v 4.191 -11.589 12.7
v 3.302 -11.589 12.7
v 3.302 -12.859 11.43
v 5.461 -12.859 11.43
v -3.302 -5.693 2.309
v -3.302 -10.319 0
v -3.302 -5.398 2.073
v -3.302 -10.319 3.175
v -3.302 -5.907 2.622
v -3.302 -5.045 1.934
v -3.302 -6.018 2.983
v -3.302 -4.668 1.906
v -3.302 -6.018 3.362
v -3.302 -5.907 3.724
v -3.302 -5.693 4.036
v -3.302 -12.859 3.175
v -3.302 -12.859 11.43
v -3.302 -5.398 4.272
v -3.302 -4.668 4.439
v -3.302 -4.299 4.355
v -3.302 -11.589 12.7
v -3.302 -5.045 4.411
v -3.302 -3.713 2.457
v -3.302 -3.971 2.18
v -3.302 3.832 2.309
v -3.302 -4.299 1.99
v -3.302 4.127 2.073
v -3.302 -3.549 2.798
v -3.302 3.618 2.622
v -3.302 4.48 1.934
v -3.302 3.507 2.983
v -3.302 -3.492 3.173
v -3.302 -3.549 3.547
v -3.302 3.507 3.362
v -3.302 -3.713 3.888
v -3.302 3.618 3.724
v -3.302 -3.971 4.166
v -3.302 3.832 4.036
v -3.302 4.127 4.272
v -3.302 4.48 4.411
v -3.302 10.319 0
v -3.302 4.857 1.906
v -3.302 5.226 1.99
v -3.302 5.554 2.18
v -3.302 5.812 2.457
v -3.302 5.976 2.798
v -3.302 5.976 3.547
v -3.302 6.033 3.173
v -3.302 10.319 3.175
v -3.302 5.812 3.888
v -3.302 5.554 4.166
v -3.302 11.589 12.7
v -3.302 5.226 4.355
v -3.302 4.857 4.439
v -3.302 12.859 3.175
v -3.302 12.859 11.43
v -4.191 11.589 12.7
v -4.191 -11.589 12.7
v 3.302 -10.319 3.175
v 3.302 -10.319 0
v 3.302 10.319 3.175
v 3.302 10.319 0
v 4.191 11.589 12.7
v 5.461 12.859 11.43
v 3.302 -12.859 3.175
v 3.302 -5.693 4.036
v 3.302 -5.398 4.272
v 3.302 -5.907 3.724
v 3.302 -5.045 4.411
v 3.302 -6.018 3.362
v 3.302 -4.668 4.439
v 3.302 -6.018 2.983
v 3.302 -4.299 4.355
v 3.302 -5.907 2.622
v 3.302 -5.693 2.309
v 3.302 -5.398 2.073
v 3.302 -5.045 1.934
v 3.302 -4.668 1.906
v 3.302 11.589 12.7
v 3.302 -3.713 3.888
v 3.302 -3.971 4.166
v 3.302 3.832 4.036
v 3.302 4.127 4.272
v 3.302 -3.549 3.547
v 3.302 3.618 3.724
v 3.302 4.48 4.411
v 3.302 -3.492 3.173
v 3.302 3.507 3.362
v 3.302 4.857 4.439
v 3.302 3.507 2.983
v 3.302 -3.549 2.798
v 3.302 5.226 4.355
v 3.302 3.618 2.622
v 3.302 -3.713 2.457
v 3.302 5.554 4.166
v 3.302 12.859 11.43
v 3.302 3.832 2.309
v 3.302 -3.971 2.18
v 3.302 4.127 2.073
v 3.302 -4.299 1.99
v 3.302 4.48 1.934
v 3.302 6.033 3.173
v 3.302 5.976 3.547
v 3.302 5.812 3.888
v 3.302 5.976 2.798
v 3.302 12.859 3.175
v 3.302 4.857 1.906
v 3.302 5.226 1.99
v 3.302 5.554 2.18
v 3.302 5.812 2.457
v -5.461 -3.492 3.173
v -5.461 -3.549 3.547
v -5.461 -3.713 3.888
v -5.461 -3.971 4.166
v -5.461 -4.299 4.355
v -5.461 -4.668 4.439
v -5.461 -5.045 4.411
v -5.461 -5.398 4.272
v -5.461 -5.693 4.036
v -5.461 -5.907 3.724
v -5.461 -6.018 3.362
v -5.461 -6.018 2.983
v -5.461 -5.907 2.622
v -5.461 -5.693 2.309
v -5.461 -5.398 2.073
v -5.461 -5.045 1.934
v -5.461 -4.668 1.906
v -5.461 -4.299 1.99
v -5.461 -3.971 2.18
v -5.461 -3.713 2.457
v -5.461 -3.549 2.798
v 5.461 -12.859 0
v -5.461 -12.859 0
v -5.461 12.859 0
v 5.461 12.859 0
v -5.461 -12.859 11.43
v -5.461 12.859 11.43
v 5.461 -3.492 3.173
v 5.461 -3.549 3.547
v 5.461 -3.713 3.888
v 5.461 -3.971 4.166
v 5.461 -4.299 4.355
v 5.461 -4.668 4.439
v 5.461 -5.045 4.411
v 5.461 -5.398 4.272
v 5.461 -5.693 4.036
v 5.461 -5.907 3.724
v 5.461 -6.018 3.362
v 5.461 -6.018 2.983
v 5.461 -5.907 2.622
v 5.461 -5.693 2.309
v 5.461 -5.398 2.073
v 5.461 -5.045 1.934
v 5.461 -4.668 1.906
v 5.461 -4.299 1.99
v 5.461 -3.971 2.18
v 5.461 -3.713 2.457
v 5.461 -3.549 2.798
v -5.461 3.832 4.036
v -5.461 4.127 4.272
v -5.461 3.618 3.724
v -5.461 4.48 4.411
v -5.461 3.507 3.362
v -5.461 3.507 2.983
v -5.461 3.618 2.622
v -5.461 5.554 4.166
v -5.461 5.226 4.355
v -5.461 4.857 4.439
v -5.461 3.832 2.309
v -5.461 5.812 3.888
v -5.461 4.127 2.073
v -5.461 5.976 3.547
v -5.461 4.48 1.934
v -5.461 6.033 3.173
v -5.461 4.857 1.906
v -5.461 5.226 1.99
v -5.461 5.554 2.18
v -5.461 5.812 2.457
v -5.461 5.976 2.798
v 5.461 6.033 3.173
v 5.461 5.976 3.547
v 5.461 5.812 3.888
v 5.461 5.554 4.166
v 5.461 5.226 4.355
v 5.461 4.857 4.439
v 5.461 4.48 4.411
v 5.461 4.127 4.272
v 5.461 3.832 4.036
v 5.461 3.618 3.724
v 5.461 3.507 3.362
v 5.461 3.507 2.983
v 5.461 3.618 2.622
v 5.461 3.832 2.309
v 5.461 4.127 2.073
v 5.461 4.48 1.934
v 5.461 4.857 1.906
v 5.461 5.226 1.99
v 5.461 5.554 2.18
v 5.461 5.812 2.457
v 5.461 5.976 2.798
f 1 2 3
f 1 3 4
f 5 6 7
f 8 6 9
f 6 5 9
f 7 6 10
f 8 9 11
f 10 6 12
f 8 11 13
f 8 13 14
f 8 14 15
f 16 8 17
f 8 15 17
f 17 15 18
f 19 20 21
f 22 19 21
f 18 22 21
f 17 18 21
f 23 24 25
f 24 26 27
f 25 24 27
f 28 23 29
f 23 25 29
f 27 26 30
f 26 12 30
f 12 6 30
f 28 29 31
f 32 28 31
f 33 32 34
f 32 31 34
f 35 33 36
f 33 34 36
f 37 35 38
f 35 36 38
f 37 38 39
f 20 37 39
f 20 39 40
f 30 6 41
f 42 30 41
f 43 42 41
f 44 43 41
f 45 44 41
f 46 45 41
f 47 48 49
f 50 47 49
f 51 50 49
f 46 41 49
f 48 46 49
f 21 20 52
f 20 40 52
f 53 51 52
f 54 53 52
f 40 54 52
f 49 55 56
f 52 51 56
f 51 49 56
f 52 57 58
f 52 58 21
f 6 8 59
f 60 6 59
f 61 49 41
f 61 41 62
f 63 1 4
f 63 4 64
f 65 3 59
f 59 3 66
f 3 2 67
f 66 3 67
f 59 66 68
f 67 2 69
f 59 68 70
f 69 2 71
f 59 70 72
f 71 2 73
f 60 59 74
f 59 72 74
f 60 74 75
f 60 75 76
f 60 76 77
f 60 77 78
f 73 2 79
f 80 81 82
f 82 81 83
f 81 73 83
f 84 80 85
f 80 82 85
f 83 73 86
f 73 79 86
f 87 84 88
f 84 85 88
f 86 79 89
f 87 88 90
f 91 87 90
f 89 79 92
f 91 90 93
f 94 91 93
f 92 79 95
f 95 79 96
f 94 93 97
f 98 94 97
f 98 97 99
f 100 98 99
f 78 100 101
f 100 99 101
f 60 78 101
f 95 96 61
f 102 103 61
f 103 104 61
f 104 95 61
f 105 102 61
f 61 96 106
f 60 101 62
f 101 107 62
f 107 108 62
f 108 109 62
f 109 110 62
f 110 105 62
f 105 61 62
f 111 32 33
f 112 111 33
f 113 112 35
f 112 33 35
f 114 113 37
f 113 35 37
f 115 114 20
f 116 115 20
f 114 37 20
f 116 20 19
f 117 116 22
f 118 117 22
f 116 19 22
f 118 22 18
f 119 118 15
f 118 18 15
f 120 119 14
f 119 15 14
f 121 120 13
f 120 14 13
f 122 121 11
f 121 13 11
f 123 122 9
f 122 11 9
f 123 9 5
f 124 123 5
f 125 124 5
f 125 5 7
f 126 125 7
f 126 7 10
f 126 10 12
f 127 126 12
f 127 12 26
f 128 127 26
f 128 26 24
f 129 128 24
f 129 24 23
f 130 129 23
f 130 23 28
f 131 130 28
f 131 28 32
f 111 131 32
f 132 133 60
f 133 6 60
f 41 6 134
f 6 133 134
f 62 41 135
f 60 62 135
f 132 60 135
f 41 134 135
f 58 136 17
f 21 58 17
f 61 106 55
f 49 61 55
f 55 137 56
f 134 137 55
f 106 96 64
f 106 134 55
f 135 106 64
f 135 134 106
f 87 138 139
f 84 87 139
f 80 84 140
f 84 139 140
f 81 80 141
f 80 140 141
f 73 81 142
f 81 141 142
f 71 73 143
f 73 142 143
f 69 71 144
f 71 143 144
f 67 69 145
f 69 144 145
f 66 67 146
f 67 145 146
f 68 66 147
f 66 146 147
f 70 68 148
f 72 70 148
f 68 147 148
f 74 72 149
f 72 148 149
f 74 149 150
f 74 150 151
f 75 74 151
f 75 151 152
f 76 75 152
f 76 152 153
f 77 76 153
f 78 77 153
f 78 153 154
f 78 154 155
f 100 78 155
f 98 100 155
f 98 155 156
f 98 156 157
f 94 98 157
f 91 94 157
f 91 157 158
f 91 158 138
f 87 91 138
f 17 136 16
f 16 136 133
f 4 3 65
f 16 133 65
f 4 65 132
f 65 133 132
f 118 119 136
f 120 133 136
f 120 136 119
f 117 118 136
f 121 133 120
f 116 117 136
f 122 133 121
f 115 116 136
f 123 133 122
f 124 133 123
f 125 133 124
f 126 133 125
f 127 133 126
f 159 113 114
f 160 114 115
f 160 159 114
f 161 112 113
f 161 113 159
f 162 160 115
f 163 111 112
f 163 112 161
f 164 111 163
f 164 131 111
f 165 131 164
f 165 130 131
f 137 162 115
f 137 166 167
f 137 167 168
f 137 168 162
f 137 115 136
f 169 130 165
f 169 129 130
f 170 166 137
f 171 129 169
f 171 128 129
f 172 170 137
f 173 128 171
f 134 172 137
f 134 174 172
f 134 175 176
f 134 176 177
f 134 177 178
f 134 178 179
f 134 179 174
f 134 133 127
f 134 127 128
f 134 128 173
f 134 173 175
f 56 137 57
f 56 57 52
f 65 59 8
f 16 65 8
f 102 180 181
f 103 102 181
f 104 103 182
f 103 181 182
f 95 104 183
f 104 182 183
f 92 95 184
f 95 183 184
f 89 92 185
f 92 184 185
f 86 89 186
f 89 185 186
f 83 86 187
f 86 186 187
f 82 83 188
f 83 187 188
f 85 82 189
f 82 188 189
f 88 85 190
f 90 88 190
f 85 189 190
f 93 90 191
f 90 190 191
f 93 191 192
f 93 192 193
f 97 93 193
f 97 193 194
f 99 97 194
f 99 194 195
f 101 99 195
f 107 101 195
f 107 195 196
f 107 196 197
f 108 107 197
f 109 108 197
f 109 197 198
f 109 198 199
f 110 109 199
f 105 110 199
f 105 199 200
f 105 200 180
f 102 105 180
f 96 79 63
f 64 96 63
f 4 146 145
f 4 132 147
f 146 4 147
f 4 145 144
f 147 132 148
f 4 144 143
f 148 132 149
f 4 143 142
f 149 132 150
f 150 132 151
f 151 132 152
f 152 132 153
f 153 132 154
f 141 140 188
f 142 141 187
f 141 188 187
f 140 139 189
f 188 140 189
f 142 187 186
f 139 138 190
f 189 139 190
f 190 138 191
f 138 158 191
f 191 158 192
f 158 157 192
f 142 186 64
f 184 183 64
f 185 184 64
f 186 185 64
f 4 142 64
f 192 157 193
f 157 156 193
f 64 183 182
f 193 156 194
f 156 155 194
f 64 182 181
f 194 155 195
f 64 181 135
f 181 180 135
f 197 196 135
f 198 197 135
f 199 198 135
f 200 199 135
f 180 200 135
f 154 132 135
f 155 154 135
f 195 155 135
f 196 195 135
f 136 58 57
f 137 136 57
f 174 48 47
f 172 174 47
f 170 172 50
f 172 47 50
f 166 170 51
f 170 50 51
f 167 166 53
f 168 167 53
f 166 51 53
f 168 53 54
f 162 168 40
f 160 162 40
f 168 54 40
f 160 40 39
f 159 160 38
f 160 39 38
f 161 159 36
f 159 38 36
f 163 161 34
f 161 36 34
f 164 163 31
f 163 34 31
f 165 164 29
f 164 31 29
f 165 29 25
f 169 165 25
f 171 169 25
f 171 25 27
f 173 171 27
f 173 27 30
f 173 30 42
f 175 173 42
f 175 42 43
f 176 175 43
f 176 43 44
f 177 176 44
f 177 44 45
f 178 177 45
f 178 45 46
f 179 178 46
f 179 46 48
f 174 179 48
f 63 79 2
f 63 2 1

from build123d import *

# Parameters (mm, degrees)
F0_W     = 10.922
F0_H     = 25.7175
F1_DEPTH = 12.7
F2_W     = 6.604
F2_H     = 20.6375
F3_DEPTH = 25.4
F5_DEPTH = 32.18438
F6_R     = 1.27
F7_DEPTH = 25.4
F8_SIZE  = 1.27


with BuildPart() as f1:
    # F0 (on Top) → F1 (new body)
    with BuildSketch(Plane.XY):
        Rectangle(F0_W, F0_H)
    extrude(amount=F1_DEPTH)

    # F2 (on face) → F3 (cut)
    with BuildSketch(Plane.XY.offset(12.7)):
        Rectangle(F2_W, F2_H)
    extrude(amount=-F3_DEPTH, mode=Mode.SUBTRACT)

    # F4 (on face) → F5 (cut)
    with BuildSketch(Plane(origin=(0, 12.85875, 0), x_dir=(-1, 0, 0), z_dir=(0, 1, 0))):
        Polygon((0, 12.7), (-3.302, 12.7), (-3.302, 3.175), (3.302, 3.175), (3.302, 12.7), align=None)
    extrude(amount=-F5_DEPTH, mode=Mode.SUBTRACT)

    # F6 (on face) → F7 (cut)
    with BuildSketch(Plane.YZ.offset(5.461)):
        with Locations((-4.7625, 3.172593)):
            Circle(F6_R)
        with Locations((4.7625, 3.172593)):
            Circle(F6_R)
    extrude(amount=-F7_DEPTH, mode=Mode.SUBTRACT)

    # F8
    f8_edges = [f1.edges().sort_by_distance(p)[0] for p in [
        (-5.461, 0, 12.7),
        (5.461, 0, 12.7),
        (4.3815, 12.85875, 12.7),
        (-4.3815, 12.85875, 12.7),
        (4.3815, -12.85875, 12.7),
        (-4.3815, -12.85875, 12.7),
    ]]
    chamfer(f8_edges, length=F8_SIZE)


solid = f1.part
